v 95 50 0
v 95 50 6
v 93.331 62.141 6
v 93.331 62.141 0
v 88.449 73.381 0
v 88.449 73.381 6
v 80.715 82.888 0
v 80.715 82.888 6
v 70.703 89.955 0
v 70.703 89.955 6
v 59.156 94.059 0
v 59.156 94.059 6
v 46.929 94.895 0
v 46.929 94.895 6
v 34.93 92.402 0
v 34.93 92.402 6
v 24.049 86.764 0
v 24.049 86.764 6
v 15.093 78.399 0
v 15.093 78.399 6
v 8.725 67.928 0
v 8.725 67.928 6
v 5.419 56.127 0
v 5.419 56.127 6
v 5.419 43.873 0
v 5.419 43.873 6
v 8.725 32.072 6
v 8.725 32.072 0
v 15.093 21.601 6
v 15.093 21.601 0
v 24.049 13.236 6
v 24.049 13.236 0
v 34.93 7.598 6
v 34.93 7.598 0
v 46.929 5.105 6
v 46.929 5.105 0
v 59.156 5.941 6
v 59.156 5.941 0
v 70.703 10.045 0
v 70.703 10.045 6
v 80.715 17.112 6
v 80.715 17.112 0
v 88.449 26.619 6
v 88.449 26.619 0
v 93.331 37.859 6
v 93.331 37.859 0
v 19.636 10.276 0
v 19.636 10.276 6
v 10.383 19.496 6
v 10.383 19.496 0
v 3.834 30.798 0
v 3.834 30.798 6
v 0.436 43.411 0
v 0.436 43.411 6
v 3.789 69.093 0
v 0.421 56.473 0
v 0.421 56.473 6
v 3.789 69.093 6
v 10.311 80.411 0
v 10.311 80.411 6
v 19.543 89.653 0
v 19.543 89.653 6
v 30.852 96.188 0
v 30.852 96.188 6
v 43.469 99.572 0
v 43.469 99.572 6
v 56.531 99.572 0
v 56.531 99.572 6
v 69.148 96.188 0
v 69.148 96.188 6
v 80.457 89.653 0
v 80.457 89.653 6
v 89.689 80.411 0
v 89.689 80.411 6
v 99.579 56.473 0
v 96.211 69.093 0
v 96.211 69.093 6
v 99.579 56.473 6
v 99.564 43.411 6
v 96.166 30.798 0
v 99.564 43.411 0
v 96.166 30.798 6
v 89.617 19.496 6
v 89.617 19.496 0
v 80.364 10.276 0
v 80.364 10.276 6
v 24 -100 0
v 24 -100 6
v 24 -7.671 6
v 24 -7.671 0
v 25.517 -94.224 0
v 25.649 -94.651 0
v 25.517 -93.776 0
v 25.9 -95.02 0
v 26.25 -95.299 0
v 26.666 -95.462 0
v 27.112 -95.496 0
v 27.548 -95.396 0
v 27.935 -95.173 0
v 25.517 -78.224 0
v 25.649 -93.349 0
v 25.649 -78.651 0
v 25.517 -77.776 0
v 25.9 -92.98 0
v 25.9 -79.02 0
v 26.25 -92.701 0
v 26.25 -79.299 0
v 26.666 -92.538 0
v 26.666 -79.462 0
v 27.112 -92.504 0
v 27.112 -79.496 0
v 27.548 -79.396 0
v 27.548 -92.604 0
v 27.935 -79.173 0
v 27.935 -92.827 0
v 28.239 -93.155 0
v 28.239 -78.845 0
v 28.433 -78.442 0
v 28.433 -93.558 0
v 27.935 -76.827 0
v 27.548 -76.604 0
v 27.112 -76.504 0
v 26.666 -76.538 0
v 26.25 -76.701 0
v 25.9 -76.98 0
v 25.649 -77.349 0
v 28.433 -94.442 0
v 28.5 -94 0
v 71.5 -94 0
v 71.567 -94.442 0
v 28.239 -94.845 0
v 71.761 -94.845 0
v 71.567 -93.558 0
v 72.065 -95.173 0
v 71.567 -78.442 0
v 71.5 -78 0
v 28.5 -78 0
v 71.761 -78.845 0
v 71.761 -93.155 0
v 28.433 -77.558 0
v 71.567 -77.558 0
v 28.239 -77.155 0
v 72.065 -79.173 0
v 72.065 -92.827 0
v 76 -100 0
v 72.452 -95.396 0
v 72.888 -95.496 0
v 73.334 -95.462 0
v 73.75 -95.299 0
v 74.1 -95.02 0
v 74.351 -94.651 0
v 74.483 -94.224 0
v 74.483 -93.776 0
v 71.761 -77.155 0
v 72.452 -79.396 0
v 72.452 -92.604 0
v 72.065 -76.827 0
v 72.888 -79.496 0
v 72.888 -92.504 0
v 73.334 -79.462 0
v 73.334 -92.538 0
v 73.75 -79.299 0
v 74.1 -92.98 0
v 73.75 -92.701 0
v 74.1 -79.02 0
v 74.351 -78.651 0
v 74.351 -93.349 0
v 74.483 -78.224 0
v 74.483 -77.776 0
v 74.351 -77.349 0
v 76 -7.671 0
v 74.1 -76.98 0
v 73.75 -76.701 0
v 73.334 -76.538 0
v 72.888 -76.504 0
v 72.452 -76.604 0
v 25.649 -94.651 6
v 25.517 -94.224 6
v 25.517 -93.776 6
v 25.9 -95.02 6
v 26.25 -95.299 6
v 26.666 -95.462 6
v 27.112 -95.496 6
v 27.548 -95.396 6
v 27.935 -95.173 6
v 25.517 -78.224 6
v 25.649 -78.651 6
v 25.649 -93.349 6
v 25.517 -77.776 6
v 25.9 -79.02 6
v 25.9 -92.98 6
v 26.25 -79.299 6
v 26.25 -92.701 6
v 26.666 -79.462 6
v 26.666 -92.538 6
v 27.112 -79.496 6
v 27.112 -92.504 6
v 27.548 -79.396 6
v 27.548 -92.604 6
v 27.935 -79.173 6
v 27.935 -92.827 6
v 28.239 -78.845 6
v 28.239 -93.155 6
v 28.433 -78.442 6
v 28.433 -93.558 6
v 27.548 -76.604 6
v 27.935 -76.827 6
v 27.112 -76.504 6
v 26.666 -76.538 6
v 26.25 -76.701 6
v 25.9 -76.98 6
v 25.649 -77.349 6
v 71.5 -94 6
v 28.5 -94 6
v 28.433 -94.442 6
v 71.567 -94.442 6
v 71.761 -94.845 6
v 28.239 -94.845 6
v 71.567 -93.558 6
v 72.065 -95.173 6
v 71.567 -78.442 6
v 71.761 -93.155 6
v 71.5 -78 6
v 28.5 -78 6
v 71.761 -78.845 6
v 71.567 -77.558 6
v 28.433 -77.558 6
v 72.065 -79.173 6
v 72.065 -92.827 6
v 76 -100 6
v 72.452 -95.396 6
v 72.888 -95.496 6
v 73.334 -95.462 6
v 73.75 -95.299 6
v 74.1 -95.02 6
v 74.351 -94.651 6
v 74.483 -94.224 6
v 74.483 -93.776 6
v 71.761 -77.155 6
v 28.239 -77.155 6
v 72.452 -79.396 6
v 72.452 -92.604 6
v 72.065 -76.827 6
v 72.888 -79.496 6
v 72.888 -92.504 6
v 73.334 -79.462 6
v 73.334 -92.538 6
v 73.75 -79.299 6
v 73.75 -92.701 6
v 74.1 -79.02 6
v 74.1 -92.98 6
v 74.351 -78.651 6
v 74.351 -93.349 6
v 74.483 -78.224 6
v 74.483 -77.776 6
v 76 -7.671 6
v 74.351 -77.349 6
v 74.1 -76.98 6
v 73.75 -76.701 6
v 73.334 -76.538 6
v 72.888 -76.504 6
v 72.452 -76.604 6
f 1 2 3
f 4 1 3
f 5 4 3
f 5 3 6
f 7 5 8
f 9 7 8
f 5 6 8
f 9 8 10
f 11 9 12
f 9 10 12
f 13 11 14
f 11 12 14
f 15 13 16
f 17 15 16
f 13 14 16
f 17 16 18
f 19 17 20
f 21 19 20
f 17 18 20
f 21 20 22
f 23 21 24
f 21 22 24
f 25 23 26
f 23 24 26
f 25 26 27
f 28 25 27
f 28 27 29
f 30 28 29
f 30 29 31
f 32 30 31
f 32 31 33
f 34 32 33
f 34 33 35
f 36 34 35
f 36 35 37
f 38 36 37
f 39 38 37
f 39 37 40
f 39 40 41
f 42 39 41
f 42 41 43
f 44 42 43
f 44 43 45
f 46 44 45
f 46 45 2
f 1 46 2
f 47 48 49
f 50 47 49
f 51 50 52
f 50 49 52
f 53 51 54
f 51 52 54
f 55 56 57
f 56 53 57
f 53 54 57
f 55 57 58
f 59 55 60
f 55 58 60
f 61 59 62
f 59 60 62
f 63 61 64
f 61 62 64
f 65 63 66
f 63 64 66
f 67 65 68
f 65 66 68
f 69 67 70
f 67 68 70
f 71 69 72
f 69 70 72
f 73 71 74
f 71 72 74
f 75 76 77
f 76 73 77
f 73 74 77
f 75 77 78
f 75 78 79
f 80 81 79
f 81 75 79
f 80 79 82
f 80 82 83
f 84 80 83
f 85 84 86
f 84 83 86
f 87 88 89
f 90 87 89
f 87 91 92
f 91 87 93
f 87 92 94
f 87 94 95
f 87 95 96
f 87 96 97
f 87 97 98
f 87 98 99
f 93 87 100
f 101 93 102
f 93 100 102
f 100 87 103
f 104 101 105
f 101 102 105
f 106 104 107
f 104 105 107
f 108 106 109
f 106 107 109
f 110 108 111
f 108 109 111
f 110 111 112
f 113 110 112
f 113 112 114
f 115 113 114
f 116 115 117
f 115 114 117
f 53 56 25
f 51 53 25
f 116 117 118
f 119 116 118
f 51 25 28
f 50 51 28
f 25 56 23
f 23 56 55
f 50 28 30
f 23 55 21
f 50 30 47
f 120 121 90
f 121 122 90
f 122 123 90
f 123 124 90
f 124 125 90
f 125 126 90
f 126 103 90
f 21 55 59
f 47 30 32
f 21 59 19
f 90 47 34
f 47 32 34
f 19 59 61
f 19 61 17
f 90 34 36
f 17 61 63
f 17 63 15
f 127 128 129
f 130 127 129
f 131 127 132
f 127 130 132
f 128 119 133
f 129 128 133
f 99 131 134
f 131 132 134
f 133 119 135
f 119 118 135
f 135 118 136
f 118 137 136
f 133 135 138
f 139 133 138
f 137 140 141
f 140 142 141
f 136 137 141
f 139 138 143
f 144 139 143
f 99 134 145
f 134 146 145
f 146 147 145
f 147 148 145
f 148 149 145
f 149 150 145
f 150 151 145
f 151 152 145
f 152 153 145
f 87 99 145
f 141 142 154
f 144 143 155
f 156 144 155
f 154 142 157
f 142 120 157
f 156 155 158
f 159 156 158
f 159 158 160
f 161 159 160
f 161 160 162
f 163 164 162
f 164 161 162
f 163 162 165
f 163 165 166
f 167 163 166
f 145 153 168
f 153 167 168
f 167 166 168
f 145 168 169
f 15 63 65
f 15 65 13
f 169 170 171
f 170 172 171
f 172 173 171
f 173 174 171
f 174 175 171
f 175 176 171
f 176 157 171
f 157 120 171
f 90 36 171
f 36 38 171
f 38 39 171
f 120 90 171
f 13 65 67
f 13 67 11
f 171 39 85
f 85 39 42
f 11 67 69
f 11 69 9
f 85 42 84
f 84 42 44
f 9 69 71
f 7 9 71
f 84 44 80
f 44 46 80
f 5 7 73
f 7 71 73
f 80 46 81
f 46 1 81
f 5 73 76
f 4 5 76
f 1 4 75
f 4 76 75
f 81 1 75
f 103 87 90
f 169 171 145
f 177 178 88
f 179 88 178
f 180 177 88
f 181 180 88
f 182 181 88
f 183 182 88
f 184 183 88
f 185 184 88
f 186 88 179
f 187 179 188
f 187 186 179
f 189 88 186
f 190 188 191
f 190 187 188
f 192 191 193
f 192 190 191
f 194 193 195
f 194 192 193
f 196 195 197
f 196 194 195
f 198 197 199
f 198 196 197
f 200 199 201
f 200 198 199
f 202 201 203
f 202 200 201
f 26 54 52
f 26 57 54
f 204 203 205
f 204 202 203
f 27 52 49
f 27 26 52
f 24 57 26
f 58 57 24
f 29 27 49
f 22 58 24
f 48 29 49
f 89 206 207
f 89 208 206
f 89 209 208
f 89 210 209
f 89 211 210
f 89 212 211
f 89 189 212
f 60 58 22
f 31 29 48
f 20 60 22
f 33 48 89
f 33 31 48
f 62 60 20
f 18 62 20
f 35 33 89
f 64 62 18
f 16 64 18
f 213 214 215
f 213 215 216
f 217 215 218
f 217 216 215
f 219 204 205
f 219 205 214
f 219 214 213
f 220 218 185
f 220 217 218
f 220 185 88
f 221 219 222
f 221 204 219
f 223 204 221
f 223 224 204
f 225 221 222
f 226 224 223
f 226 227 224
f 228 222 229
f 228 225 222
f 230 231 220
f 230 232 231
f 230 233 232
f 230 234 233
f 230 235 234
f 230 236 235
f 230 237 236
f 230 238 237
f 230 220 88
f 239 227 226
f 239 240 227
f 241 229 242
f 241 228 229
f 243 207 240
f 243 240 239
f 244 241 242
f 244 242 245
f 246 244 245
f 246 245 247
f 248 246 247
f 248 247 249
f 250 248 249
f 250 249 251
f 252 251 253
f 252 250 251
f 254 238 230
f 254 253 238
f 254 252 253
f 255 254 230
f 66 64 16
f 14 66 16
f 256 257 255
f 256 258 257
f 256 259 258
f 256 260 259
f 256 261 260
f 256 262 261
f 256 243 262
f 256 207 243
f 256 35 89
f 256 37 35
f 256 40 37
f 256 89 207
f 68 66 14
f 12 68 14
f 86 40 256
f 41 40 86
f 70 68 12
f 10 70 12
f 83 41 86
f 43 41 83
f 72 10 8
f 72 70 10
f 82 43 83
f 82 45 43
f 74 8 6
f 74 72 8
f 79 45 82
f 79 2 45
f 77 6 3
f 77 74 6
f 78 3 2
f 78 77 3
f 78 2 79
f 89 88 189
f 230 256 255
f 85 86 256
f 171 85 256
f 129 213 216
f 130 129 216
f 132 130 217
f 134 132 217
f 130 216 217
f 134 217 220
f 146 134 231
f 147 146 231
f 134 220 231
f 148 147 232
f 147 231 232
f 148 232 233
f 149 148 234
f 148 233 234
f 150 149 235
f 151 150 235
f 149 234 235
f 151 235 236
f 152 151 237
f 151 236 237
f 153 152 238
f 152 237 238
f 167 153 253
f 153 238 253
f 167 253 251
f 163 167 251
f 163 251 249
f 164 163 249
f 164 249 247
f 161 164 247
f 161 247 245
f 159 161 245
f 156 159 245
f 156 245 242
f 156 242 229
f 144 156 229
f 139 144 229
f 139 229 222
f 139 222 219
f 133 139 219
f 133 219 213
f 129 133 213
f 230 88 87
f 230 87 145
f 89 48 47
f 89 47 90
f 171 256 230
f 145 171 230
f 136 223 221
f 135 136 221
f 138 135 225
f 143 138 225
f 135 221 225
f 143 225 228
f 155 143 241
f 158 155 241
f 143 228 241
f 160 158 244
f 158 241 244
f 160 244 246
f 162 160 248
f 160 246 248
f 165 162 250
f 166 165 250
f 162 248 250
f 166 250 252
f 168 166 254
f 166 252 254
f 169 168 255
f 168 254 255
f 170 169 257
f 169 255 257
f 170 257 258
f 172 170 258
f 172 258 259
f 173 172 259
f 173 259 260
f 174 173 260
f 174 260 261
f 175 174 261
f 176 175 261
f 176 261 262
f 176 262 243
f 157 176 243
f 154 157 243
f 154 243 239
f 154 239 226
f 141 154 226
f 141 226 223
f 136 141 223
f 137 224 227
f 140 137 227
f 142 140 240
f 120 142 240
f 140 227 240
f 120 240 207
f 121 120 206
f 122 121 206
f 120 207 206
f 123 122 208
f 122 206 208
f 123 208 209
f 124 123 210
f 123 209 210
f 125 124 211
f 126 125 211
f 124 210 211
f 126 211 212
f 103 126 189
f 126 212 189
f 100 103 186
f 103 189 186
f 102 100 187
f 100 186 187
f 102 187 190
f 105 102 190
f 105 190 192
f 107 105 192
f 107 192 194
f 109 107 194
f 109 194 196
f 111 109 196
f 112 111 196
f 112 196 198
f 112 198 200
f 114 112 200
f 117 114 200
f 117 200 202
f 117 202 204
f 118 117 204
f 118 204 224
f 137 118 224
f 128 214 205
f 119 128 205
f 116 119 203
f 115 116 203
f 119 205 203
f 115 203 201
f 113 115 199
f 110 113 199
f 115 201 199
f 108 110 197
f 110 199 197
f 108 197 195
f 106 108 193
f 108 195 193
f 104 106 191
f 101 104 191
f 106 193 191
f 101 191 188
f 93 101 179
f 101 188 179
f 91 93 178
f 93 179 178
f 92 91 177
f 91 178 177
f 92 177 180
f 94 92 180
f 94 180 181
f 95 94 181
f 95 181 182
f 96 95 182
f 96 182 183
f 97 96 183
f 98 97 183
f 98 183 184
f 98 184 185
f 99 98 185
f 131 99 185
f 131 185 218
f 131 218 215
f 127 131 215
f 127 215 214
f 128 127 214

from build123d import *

# Parameters (mm, degrees)
ESQUISSE1_W             = 100
ESQUISSE1_H             = 100
BOSS_EXTRU_1_DEPTH      = 6
ESQUISSE2_R             = 45
ENL_V_MAT_EXTRU_1_DEPTH = 142.548578234
ESQUISSE3_W             = 100
ESQUISSE3_H             = 100
BOSS_EXTRU_2_DEPTH      = 6
ESQUISSE4_W             = 24
ESQUISSE4_H             = 100
ENL_V_MAT_EXTRU_2_DEPTH = 6
ESQUISSE5_R             = 1.5
ENL_V_MAT_EXTRU_3_DEPTH = 142.548578234
ENL_V_MAT_EXTRU_4_DEPTH = 142.548578234
CHANFREIN1_SIZE         = 14.962611718


with BuildPart() as part:
    # Esquisse1 → Boss.-Extru.1 (new body)
    with BuildSketch(Plane.XY):
        with Locations((50, 50)):
            Rectangle(ESQUISSE1_W, ESQUISSE1_H)
    extrude(amount=BOSS_EXTRU_1_DEPTH)

    # Esquisse2 → Enlèv. mat.-Extru.1 (cut, through all)
    with BuildSketch(Plane.XY.offset(6)):
        with Locations((50, 50)):
            Circle(ESQUISSE2_R)
    extrude(amount=-ENL_V_MAT_EXTRU_1_DEPTH, mode=Mode.SUBTRACT)

    # Esquisse3 → Boss.-Extru.2 (add)
    with BuildSketch(Plane.XY.offset(6)):
        with Locations((50, -50)):
            Rectangle(ESQUISSE3_W, ESQUISSE3_H)
    extrude(amount=-BOSS_EXTRU_2_DEPTH)

    # Esquisse4 → Enlèv. mat.-Extru.2 (cut)
    with BuildSketch(Plane.XY.offset(6)):
        with Locations((12, -50)):
            Rectangle(ESQUISSE4_W, ESQUISSE4_H)
        with Locations((88, -50)):
            Rectangle(ESQUISSE4_W, ESQUISSE4_H)
    extrude(amount=-ENL_V_MAT_EXTRU_2_DEPTH, mode=Mode.SUBTRACT)

    # Esquisse5 → Enlèv. mat.-Extru.3 (cut, through all)
    with BuildSketch(Plane.XY.offset(6)):
        with Locations((27, -78)):
            Circle(ESQUISSE5_R)
        with Locations((27, -94)):
            Circle(ESQUISSE5_R)
        with Locations(Location((73, -94, 0), (0, 0, 180))):
            Circle(ESQUISSE5_R)
        with Locations(Location((73, -78, 0), (0, 0, 180))):
            Circle(ESQUISSE5_R)
    extrude(amount=-ENL_V_MAT_EXTRU_3_DEPTH, mode=Mode.SUBTRACT)

    # Esquisse6 → Enlèv. mat.-Extru.4 (cut, through all)
    with BuildSketch(Plane.XY.offset(6)):
        with BuildLine():
            Line((76, 7.291686992), (76, 0))
            Line((76, 0), (101, 0))
            Line((101, 0), (101, 101))
            Line((101, 101), (-1, 101))
            Line((-1, 101), (-1, 0))
            Line((-1, 0), (24, 0))
            Line((24, 0), (24, 7.291686992))
            ThreePointArc((24, 7.291686992), (50, 100), (76, 7.291686992))
        make_face()
    extrude(amount=-ENL_V_MAT_EXTRU_4_DEPTH, mode=Mode.SUBTRACT)

    # Chanfrein1
    # the kernel refuses this chamfer: 14.962611718, 5 mm, written as the material it adds along each edge
    with BuildSketch(Plane(origin=(76, 7.291686992, 6), x_dir=(0.8254797465203109, 0.564431739083446, 0), z_dir=(0, 0, -1))) as chanfrein1_piece_1:
        with BuildLine():
            Line((5.28690795, 0), (-CHANFREIN1_SIZE * 0.564431739076, CHANFREIN1_SIZE * 0.825479746509))
            Line((-CHANFREIN1_SIZE * 0.564431739076, CHANFREIN1_SIZE * 0.825479746509), (0, 0))
            ThreePointArc((0, 0), (2.867154561, 0.069426966), (5.28690795, 0))
        make_face()
    extrude(amount=6)
    with BuildSketch(Plane(origin=(24, 7.291686992, 6), x_dir=(-0.8254797465203098, 0.5644317390834476, 0), z_dir=(0, 0, -1))) as chanfrein1_piece_2:
        with BuildLine():
            Line((5.28690795, 0), (-CHANFREIN1_SIZE * 0.564431739076, -CHANFREIN1_SIZE * 0.825479746509))
            Line((-CHANFREIN1_SIZE * 0.564431739076, -CHANFREIN1_SIZE * 0.825479746509), (0, 0))
            ThreePointArc((0, 0), (2.867154561, -0.069426966), (5.28690795, 0))
        make_face()
    extrude(amount=6)


solid = part.part
